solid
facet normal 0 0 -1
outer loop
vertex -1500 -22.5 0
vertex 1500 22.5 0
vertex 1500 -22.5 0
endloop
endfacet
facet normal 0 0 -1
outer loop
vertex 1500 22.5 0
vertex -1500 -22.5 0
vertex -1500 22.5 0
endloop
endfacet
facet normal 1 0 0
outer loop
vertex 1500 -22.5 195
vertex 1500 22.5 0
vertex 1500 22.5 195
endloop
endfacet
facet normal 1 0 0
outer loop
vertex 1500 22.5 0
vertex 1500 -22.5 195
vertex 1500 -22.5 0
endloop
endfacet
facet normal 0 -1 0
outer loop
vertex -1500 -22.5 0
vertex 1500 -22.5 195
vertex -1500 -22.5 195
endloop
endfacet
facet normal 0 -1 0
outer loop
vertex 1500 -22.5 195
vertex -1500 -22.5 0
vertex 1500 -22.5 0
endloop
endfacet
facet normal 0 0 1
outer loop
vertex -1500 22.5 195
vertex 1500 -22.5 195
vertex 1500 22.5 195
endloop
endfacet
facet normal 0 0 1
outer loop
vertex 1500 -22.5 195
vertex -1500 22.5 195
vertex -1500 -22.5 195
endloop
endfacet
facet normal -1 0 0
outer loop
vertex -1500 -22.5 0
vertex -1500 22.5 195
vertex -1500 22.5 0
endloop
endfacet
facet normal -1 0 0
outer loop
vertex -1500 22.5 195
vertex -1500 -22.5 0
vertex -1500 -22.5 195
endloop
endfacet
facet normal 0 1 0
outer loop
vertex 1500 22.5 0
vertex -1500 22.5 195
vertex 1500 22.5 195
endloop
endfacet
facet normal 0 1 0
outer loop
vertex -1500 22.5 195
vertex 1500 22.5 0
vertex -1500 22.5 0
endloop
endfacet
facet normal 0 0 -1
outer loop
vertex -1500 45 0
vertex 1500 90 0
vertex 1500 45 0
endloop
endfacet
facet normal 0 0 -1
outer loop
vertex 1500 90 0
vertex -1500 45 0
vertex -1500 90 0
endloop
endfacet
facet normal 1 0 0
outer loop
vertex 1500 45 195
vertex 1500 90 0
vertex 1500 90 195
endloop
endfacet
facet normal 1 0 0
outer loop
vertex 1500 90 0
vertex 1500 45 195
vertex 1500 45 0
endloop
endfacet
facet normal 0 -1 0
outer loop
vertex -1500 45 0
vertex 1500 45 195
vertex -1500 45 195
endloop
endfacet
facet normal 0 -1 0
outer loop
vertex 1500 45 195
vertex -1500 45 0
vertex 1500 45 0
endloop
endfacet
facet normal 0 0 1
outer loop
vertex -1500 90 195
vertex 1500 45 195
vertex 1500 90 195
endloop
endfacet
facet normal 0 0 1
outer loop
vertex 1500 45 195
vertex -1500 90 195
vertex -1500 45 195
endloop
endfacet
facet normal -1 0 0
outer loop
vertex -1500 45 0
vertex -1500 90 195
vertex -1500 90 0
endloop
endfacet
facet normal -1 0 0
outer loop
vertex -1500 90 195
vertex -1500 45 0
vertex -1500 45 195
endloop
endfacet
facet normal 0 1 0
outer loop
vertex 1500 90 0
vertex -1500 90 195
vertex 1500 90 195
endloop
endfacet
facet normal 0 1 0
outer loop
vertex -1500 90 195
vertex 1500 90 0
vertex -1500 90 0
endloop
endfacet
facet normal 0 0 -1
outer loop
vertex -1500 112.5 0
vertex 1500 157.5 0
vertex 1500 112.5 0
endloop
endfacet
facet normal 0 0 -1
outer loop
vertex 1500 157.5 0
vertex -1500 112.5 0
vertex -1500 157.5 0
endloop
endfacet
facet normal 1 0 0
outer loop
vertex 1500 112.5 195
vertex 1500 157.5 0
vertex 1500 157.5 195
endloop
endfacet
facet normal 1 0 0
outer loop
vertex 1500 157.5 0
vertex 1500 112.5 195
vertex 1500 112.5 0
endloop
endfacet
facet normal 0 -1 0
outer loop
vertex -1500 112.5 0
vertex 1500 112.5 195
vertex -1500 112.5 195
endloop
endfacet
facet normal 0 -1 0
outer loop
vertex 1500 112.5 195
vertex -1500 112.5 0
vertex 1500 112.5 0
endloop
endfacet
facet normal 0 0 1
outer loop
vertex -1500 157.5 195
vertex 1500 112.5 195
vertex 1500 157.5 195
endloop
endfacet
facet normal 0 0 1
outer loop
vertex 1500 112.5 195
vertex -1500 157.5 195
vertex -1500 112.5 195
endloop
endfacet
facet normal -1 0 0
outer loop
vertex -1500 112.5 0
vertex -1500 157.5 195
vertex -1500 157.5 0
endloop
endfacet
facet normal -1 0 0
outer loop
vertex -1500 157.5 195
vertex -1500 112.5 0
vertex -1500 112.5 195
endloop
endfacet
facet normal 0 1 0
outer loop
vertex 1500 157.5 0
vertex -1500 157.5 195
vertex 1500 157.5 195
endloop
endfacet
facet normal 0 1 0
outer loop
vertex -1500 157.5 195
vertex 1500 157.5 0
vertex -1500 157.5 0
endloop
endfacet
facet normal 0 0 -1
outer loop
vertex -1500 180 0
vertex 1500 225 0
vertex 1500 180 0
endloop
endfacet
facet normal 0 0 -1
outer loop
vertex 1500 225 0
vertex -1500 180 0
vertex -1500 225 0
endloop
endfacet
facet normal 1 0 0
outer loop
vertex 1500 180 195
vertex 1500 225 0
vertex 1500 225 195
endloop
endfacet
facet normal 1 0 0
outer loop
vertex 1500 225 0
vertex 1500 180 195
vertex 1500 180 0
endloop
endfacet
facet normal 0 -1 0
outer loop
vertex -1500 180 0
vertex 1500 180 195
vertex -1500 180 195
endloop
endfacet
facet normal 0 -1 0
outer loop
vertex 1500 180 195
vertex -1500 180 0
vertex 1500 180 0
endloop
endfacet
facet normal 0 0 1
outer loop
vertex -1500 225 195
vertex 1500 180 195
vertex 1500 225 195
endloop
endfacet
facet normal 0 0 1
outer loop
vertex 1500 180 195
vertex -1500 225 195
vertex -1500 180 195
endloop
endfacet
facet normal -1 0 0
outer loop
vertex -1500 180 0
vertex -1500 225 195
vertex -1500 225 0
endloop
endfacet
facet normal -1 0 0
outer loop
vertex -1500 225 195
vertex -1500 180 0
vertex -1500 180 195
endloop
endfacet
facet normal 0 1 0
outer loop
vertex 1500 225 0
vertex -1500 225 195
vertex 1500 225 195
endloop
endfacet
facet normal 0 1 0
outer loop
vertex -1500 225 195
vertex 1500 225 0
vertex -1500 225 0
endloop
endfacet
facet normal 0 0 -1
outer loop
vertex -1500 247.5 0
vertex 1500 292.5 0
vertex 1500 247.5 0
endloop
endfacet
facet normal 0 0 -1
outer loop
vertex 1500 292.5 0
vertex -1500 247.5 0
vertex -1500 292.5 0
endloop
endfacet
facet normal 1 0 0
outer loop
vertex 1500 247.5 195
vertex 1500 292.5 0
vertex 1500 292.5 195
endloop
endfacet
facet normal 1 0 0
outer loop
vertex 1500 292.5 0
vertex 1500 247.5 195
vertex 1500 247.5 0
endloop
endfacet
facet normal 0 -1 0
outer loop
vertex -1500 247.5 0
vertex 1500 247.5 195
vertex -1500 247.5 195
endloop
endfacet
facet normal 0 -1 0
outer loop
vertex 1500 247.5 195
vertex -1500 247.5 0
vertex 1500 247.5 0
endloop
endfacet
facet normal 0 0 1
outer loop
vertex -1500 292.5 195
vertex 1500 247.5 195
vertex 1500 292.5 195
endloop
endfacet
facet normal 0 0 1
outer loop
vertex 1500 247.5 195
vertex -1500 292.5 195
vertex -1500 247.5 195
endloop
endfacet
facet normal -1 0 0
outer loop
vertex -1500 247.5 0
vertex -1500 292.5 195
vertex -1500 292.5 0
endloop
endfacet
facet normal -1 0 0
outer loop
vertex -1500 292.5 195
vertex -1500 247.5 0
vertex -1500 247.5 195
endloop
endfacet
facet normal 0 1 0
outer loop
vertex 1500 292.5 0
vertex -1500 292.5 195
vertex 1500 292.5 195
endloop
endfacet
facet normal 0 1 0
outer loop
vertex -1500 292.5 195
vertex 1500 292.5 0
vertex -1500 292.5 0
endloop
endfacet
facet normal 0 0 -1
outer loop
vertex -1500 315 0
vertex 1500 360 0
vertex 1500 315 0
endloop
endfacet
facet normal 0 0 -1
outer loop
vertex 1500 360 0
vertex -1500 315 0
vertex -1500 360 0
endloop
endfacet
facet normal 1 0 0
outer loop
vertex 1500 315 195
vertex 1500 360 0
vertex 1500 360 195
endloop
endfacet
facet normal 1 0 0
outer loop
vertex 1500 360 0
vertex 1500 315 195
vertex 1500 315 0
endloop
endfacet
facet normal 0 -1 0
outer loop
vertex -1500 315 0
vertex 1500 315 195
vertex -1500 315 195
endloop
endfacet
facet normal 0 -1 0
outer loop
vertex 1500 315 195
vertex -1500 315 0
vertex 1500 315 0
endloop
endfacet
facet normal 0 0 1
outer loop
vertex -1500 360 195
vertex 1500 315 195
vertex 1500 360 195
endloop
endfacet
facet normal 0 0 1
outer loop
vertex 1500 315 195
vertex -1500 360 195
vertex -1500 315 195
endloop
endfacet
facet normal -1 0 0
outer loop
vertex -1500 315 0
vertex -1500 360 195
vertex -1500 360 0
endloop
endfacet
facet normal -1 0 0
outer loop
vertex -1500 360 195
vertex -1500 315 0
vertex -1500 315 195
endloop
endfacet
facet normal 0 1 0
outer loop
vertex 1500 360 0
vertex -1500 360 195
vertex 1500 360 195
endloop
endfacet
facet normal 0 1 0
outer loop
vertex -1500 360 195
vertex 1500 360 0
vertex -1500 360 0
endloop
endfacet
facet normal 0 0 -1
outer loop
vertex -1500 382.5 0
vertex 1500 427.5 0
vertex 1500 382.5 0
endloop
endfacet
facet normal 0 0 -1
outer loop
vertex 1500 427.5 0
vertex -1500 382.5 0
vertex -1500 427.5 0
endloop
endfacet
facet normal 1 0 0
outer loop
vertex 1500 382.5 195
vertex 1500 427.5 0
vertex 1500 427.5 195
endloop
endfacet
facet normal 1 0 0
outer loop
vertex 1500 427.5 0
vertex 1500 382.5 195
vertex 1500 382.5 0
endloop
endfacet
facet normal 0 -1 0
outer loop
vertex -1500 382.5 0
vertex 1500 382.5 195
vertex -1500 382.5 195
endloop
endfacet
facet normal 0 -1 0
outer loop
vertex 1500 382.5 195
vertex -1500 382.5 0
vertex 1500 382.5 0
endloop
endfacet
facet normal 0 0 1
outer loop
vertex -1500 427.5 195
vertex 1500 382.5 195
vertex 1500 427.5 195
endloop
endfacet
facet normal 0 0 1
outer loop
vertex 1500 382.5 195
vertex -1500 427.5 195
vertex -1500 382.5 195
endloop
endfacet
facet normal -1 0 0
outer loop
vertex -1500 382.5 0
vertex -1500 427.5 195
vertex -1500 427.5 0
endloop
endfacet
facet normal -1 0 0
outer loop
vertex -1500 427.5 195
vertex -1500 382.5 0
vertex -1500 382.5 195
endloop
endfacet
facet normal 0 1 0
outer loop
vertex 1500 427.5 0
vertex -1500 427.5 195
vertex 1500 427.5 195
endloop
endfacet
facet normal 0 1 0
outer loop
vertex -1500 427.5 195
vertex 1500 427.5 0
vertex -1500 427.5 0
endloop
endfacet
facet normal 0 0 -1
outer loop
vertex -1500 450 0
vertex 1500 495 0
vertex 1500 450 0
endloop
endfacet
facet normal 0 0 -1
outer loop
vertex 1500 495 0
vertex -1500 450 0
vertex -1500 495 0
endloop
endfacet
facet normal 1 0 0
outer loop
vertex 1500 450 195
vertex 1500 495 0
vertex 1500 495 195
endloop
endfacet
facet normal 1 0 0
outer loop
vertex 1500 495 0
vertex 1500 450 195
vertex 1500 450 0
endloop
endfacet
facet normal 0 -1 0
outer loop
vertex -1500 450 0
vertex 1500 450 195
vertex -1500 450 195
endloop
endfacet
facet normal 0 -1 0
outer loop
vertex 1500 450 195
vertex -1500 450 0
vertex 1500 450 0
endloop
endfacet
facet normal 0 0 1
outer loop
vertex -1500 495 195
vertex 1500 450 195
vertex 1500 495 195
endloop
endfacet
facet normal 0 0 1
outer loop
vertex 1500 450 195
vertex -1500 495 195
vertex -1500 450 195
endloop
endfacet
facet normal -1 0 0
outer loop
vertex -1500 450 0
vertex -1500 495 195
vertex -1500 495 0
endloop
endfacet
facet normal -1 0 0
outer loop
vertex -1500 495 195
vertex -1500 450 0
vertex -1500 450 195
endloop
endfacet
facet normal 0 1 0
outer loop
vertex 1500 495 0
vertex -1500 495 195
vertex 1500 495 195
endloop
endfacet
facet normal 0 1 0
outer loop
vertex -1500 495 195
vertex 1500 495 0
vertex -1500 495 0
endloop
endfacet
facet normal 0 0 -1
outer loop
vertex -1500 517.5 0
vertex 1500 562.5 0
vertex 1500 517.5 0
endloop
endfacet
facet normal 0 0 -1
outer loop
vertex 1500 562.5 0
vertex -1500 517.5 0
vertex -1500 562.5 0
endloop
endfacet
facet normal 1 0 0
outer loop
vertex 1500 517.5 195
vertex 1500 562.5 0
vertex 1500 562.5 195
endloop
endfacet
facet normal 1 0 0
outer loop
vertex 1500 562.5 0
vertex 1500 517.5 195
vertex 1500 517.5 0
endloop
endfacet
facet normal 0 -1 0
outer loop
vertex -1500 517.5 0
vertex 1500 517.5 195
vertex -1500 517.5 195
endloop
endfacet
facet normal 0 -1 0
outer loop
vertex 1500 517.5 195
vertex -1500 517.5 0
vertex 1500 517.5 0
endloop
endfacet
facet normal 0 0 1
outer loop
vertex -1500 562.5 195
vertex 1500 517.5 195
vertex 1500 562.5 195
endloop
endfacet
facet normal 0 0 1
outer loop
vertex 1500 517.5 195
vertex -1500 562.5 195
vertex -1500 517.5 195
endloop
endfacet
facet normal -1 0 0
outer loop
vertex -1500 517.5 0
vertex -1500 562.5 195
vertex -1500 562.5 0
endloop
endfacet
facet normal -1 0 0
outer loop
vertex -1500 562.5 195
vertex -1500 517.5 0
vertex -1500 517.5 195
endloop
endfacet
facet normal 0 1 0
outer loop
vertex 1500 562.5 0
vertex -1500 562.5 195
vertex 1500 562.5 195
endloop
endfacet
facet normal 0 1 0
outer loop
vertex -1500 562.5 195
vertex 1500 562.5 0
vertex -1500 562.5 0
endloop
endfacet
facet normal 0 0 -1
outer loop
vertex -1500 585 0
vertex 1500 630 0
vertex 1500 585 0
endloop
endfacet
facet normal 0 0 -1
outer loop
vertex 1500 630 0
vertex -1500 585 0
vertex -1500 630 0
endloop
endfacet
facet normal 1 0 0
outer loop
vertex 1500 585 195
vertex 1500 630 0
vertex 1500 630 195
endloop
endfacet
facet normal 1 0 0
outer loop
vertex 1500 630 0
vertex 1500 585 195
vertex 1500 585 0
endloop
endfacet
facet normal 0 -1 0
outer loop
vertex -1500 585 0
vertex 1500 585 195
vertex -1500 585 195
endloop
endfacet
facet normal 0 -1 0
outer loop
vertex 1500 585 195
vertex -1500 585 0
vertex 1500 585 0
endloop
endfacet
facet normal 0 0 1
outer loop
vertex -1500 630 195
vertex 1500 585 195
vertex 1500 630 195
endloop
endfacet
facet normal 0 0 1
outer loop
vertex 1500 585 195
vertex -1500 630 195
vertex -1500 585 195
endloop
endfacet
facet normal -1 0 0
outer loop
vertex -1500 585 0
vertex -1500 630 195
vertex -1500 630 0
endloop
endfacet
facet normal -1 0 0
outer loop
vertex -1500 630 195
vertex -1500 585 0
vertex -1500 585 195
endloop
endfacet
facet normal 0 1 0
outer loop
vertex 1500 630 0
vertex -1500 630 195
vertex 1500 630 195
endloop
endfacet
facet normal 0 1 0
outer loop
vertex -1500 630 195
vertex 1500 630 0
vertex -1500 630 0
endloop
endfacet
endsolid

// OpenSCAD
union()
{
    union()
    {
        union()
        {
            union()
            {
                union()
                {
                    union()
                    {
                        union()
                        {
                            union()
                            {
                                union()
                                {
                                    linear_extrude(height = 195.0, twist = 0.0, scale = 1.0, slices = 1, center = false)
                                    {
                                        scale([3000.0, 45.0])
                                        {
                                            M52();
                                        }
                                    }
                                    translate([0.0, 67.5, 0.0])
                                    {
                                        linear_extrude(height = 195.0, twist = 0.0, scale = 1.0, slices = 1, center = false)
                                        {
                                            scale([3000.0, 45.0])
                                            {
                                                M52();
                                            }
                                        }
                                    }
                                }
                                translate([0.0, 135.0, 0.0])
                                {
                                    linear_extrude(height = 195.0, twist = 0.0, scale = 1.0, slices = 1, center = false)
                                    {
                                        scale([3000.0, 45.0])
                                        {
                                            M52();
                                        }
                                    }
                                }
                            }
                            translate([0.0, 202.5, 0.0])
                            {
                                linear_extrude(height = 195.0, twist = 0.0, scale = 1.0, slices = 1, center = false)
                                {
                                    scale([3000.0, 45.0])
                                    {
                                        M52();
                                    }
                                }
                            }
                        }
                        translate([0.0, 270.0, 0.0])
                        {
                            linear_extrude(height = 195.0, twist = 0.0, scale = 1.0, slices = 1, center = false)
                            {
                                scale([3000.0, 45.0])
                                {
                                    M52();
                                }
                            }
                        }
                    }
                    translate([0.0, 337.5, 0.0])
                    {
                        linear_extrude(height = 195.0, twist = 0.0, scale = 1.0, slices = 1, center = false)
                        {
                            scale([3000.0, 45.0])
                            {
                                M52();
                            }
                        }
                    }
                }
                translate([0.0, 405.0, 0.0])
                {
                    linear_extrude(height = 195.0, twist = 0.0, scale = 1.0, slices = 1, center = false)
                    {
                        scale([3000.0, 45.0])
                        {
                            M52();
                        }
                    }
                }
            }
            translate([0.0, 472.5, 0.0])
            {
                linear_extrude(height = 195.0, twist = 0.0, scale = 1.0, slices = 1, center = false)
                {
                    scale([3000.0, 45.0])
                    {
                        M52();
                    }
                }
            }
        }
        translate([0.0, 540.0, 0.0])
        {
            linear_extrude(height = 195.0, twist = 0.0, scale = 1.0, slices = 1, center = false)
            {
                scale([3000.0, 45.0])
                {
                    M52();
                }
            }
        }
    }
    translate([0.0, 607.5, 0.0])
    {
        linear_extrude(height = 195.0, twist = 0.0, scale = 1.0, slices = 1, center = false)
        {
            scale([3000.0, 45.0])
            {
                M52();
            }
        }
    }
}

module M52()
{
    polygon
    (
        points =
        [
            [-0.5, -0.5], 
            [0.5, -0.5], 
            [0.5, 0.5], 
            [-0.5, 0.5]
        ],
        paths =
        [
            [0, 1, 2, 3]
        ]
    );
}
